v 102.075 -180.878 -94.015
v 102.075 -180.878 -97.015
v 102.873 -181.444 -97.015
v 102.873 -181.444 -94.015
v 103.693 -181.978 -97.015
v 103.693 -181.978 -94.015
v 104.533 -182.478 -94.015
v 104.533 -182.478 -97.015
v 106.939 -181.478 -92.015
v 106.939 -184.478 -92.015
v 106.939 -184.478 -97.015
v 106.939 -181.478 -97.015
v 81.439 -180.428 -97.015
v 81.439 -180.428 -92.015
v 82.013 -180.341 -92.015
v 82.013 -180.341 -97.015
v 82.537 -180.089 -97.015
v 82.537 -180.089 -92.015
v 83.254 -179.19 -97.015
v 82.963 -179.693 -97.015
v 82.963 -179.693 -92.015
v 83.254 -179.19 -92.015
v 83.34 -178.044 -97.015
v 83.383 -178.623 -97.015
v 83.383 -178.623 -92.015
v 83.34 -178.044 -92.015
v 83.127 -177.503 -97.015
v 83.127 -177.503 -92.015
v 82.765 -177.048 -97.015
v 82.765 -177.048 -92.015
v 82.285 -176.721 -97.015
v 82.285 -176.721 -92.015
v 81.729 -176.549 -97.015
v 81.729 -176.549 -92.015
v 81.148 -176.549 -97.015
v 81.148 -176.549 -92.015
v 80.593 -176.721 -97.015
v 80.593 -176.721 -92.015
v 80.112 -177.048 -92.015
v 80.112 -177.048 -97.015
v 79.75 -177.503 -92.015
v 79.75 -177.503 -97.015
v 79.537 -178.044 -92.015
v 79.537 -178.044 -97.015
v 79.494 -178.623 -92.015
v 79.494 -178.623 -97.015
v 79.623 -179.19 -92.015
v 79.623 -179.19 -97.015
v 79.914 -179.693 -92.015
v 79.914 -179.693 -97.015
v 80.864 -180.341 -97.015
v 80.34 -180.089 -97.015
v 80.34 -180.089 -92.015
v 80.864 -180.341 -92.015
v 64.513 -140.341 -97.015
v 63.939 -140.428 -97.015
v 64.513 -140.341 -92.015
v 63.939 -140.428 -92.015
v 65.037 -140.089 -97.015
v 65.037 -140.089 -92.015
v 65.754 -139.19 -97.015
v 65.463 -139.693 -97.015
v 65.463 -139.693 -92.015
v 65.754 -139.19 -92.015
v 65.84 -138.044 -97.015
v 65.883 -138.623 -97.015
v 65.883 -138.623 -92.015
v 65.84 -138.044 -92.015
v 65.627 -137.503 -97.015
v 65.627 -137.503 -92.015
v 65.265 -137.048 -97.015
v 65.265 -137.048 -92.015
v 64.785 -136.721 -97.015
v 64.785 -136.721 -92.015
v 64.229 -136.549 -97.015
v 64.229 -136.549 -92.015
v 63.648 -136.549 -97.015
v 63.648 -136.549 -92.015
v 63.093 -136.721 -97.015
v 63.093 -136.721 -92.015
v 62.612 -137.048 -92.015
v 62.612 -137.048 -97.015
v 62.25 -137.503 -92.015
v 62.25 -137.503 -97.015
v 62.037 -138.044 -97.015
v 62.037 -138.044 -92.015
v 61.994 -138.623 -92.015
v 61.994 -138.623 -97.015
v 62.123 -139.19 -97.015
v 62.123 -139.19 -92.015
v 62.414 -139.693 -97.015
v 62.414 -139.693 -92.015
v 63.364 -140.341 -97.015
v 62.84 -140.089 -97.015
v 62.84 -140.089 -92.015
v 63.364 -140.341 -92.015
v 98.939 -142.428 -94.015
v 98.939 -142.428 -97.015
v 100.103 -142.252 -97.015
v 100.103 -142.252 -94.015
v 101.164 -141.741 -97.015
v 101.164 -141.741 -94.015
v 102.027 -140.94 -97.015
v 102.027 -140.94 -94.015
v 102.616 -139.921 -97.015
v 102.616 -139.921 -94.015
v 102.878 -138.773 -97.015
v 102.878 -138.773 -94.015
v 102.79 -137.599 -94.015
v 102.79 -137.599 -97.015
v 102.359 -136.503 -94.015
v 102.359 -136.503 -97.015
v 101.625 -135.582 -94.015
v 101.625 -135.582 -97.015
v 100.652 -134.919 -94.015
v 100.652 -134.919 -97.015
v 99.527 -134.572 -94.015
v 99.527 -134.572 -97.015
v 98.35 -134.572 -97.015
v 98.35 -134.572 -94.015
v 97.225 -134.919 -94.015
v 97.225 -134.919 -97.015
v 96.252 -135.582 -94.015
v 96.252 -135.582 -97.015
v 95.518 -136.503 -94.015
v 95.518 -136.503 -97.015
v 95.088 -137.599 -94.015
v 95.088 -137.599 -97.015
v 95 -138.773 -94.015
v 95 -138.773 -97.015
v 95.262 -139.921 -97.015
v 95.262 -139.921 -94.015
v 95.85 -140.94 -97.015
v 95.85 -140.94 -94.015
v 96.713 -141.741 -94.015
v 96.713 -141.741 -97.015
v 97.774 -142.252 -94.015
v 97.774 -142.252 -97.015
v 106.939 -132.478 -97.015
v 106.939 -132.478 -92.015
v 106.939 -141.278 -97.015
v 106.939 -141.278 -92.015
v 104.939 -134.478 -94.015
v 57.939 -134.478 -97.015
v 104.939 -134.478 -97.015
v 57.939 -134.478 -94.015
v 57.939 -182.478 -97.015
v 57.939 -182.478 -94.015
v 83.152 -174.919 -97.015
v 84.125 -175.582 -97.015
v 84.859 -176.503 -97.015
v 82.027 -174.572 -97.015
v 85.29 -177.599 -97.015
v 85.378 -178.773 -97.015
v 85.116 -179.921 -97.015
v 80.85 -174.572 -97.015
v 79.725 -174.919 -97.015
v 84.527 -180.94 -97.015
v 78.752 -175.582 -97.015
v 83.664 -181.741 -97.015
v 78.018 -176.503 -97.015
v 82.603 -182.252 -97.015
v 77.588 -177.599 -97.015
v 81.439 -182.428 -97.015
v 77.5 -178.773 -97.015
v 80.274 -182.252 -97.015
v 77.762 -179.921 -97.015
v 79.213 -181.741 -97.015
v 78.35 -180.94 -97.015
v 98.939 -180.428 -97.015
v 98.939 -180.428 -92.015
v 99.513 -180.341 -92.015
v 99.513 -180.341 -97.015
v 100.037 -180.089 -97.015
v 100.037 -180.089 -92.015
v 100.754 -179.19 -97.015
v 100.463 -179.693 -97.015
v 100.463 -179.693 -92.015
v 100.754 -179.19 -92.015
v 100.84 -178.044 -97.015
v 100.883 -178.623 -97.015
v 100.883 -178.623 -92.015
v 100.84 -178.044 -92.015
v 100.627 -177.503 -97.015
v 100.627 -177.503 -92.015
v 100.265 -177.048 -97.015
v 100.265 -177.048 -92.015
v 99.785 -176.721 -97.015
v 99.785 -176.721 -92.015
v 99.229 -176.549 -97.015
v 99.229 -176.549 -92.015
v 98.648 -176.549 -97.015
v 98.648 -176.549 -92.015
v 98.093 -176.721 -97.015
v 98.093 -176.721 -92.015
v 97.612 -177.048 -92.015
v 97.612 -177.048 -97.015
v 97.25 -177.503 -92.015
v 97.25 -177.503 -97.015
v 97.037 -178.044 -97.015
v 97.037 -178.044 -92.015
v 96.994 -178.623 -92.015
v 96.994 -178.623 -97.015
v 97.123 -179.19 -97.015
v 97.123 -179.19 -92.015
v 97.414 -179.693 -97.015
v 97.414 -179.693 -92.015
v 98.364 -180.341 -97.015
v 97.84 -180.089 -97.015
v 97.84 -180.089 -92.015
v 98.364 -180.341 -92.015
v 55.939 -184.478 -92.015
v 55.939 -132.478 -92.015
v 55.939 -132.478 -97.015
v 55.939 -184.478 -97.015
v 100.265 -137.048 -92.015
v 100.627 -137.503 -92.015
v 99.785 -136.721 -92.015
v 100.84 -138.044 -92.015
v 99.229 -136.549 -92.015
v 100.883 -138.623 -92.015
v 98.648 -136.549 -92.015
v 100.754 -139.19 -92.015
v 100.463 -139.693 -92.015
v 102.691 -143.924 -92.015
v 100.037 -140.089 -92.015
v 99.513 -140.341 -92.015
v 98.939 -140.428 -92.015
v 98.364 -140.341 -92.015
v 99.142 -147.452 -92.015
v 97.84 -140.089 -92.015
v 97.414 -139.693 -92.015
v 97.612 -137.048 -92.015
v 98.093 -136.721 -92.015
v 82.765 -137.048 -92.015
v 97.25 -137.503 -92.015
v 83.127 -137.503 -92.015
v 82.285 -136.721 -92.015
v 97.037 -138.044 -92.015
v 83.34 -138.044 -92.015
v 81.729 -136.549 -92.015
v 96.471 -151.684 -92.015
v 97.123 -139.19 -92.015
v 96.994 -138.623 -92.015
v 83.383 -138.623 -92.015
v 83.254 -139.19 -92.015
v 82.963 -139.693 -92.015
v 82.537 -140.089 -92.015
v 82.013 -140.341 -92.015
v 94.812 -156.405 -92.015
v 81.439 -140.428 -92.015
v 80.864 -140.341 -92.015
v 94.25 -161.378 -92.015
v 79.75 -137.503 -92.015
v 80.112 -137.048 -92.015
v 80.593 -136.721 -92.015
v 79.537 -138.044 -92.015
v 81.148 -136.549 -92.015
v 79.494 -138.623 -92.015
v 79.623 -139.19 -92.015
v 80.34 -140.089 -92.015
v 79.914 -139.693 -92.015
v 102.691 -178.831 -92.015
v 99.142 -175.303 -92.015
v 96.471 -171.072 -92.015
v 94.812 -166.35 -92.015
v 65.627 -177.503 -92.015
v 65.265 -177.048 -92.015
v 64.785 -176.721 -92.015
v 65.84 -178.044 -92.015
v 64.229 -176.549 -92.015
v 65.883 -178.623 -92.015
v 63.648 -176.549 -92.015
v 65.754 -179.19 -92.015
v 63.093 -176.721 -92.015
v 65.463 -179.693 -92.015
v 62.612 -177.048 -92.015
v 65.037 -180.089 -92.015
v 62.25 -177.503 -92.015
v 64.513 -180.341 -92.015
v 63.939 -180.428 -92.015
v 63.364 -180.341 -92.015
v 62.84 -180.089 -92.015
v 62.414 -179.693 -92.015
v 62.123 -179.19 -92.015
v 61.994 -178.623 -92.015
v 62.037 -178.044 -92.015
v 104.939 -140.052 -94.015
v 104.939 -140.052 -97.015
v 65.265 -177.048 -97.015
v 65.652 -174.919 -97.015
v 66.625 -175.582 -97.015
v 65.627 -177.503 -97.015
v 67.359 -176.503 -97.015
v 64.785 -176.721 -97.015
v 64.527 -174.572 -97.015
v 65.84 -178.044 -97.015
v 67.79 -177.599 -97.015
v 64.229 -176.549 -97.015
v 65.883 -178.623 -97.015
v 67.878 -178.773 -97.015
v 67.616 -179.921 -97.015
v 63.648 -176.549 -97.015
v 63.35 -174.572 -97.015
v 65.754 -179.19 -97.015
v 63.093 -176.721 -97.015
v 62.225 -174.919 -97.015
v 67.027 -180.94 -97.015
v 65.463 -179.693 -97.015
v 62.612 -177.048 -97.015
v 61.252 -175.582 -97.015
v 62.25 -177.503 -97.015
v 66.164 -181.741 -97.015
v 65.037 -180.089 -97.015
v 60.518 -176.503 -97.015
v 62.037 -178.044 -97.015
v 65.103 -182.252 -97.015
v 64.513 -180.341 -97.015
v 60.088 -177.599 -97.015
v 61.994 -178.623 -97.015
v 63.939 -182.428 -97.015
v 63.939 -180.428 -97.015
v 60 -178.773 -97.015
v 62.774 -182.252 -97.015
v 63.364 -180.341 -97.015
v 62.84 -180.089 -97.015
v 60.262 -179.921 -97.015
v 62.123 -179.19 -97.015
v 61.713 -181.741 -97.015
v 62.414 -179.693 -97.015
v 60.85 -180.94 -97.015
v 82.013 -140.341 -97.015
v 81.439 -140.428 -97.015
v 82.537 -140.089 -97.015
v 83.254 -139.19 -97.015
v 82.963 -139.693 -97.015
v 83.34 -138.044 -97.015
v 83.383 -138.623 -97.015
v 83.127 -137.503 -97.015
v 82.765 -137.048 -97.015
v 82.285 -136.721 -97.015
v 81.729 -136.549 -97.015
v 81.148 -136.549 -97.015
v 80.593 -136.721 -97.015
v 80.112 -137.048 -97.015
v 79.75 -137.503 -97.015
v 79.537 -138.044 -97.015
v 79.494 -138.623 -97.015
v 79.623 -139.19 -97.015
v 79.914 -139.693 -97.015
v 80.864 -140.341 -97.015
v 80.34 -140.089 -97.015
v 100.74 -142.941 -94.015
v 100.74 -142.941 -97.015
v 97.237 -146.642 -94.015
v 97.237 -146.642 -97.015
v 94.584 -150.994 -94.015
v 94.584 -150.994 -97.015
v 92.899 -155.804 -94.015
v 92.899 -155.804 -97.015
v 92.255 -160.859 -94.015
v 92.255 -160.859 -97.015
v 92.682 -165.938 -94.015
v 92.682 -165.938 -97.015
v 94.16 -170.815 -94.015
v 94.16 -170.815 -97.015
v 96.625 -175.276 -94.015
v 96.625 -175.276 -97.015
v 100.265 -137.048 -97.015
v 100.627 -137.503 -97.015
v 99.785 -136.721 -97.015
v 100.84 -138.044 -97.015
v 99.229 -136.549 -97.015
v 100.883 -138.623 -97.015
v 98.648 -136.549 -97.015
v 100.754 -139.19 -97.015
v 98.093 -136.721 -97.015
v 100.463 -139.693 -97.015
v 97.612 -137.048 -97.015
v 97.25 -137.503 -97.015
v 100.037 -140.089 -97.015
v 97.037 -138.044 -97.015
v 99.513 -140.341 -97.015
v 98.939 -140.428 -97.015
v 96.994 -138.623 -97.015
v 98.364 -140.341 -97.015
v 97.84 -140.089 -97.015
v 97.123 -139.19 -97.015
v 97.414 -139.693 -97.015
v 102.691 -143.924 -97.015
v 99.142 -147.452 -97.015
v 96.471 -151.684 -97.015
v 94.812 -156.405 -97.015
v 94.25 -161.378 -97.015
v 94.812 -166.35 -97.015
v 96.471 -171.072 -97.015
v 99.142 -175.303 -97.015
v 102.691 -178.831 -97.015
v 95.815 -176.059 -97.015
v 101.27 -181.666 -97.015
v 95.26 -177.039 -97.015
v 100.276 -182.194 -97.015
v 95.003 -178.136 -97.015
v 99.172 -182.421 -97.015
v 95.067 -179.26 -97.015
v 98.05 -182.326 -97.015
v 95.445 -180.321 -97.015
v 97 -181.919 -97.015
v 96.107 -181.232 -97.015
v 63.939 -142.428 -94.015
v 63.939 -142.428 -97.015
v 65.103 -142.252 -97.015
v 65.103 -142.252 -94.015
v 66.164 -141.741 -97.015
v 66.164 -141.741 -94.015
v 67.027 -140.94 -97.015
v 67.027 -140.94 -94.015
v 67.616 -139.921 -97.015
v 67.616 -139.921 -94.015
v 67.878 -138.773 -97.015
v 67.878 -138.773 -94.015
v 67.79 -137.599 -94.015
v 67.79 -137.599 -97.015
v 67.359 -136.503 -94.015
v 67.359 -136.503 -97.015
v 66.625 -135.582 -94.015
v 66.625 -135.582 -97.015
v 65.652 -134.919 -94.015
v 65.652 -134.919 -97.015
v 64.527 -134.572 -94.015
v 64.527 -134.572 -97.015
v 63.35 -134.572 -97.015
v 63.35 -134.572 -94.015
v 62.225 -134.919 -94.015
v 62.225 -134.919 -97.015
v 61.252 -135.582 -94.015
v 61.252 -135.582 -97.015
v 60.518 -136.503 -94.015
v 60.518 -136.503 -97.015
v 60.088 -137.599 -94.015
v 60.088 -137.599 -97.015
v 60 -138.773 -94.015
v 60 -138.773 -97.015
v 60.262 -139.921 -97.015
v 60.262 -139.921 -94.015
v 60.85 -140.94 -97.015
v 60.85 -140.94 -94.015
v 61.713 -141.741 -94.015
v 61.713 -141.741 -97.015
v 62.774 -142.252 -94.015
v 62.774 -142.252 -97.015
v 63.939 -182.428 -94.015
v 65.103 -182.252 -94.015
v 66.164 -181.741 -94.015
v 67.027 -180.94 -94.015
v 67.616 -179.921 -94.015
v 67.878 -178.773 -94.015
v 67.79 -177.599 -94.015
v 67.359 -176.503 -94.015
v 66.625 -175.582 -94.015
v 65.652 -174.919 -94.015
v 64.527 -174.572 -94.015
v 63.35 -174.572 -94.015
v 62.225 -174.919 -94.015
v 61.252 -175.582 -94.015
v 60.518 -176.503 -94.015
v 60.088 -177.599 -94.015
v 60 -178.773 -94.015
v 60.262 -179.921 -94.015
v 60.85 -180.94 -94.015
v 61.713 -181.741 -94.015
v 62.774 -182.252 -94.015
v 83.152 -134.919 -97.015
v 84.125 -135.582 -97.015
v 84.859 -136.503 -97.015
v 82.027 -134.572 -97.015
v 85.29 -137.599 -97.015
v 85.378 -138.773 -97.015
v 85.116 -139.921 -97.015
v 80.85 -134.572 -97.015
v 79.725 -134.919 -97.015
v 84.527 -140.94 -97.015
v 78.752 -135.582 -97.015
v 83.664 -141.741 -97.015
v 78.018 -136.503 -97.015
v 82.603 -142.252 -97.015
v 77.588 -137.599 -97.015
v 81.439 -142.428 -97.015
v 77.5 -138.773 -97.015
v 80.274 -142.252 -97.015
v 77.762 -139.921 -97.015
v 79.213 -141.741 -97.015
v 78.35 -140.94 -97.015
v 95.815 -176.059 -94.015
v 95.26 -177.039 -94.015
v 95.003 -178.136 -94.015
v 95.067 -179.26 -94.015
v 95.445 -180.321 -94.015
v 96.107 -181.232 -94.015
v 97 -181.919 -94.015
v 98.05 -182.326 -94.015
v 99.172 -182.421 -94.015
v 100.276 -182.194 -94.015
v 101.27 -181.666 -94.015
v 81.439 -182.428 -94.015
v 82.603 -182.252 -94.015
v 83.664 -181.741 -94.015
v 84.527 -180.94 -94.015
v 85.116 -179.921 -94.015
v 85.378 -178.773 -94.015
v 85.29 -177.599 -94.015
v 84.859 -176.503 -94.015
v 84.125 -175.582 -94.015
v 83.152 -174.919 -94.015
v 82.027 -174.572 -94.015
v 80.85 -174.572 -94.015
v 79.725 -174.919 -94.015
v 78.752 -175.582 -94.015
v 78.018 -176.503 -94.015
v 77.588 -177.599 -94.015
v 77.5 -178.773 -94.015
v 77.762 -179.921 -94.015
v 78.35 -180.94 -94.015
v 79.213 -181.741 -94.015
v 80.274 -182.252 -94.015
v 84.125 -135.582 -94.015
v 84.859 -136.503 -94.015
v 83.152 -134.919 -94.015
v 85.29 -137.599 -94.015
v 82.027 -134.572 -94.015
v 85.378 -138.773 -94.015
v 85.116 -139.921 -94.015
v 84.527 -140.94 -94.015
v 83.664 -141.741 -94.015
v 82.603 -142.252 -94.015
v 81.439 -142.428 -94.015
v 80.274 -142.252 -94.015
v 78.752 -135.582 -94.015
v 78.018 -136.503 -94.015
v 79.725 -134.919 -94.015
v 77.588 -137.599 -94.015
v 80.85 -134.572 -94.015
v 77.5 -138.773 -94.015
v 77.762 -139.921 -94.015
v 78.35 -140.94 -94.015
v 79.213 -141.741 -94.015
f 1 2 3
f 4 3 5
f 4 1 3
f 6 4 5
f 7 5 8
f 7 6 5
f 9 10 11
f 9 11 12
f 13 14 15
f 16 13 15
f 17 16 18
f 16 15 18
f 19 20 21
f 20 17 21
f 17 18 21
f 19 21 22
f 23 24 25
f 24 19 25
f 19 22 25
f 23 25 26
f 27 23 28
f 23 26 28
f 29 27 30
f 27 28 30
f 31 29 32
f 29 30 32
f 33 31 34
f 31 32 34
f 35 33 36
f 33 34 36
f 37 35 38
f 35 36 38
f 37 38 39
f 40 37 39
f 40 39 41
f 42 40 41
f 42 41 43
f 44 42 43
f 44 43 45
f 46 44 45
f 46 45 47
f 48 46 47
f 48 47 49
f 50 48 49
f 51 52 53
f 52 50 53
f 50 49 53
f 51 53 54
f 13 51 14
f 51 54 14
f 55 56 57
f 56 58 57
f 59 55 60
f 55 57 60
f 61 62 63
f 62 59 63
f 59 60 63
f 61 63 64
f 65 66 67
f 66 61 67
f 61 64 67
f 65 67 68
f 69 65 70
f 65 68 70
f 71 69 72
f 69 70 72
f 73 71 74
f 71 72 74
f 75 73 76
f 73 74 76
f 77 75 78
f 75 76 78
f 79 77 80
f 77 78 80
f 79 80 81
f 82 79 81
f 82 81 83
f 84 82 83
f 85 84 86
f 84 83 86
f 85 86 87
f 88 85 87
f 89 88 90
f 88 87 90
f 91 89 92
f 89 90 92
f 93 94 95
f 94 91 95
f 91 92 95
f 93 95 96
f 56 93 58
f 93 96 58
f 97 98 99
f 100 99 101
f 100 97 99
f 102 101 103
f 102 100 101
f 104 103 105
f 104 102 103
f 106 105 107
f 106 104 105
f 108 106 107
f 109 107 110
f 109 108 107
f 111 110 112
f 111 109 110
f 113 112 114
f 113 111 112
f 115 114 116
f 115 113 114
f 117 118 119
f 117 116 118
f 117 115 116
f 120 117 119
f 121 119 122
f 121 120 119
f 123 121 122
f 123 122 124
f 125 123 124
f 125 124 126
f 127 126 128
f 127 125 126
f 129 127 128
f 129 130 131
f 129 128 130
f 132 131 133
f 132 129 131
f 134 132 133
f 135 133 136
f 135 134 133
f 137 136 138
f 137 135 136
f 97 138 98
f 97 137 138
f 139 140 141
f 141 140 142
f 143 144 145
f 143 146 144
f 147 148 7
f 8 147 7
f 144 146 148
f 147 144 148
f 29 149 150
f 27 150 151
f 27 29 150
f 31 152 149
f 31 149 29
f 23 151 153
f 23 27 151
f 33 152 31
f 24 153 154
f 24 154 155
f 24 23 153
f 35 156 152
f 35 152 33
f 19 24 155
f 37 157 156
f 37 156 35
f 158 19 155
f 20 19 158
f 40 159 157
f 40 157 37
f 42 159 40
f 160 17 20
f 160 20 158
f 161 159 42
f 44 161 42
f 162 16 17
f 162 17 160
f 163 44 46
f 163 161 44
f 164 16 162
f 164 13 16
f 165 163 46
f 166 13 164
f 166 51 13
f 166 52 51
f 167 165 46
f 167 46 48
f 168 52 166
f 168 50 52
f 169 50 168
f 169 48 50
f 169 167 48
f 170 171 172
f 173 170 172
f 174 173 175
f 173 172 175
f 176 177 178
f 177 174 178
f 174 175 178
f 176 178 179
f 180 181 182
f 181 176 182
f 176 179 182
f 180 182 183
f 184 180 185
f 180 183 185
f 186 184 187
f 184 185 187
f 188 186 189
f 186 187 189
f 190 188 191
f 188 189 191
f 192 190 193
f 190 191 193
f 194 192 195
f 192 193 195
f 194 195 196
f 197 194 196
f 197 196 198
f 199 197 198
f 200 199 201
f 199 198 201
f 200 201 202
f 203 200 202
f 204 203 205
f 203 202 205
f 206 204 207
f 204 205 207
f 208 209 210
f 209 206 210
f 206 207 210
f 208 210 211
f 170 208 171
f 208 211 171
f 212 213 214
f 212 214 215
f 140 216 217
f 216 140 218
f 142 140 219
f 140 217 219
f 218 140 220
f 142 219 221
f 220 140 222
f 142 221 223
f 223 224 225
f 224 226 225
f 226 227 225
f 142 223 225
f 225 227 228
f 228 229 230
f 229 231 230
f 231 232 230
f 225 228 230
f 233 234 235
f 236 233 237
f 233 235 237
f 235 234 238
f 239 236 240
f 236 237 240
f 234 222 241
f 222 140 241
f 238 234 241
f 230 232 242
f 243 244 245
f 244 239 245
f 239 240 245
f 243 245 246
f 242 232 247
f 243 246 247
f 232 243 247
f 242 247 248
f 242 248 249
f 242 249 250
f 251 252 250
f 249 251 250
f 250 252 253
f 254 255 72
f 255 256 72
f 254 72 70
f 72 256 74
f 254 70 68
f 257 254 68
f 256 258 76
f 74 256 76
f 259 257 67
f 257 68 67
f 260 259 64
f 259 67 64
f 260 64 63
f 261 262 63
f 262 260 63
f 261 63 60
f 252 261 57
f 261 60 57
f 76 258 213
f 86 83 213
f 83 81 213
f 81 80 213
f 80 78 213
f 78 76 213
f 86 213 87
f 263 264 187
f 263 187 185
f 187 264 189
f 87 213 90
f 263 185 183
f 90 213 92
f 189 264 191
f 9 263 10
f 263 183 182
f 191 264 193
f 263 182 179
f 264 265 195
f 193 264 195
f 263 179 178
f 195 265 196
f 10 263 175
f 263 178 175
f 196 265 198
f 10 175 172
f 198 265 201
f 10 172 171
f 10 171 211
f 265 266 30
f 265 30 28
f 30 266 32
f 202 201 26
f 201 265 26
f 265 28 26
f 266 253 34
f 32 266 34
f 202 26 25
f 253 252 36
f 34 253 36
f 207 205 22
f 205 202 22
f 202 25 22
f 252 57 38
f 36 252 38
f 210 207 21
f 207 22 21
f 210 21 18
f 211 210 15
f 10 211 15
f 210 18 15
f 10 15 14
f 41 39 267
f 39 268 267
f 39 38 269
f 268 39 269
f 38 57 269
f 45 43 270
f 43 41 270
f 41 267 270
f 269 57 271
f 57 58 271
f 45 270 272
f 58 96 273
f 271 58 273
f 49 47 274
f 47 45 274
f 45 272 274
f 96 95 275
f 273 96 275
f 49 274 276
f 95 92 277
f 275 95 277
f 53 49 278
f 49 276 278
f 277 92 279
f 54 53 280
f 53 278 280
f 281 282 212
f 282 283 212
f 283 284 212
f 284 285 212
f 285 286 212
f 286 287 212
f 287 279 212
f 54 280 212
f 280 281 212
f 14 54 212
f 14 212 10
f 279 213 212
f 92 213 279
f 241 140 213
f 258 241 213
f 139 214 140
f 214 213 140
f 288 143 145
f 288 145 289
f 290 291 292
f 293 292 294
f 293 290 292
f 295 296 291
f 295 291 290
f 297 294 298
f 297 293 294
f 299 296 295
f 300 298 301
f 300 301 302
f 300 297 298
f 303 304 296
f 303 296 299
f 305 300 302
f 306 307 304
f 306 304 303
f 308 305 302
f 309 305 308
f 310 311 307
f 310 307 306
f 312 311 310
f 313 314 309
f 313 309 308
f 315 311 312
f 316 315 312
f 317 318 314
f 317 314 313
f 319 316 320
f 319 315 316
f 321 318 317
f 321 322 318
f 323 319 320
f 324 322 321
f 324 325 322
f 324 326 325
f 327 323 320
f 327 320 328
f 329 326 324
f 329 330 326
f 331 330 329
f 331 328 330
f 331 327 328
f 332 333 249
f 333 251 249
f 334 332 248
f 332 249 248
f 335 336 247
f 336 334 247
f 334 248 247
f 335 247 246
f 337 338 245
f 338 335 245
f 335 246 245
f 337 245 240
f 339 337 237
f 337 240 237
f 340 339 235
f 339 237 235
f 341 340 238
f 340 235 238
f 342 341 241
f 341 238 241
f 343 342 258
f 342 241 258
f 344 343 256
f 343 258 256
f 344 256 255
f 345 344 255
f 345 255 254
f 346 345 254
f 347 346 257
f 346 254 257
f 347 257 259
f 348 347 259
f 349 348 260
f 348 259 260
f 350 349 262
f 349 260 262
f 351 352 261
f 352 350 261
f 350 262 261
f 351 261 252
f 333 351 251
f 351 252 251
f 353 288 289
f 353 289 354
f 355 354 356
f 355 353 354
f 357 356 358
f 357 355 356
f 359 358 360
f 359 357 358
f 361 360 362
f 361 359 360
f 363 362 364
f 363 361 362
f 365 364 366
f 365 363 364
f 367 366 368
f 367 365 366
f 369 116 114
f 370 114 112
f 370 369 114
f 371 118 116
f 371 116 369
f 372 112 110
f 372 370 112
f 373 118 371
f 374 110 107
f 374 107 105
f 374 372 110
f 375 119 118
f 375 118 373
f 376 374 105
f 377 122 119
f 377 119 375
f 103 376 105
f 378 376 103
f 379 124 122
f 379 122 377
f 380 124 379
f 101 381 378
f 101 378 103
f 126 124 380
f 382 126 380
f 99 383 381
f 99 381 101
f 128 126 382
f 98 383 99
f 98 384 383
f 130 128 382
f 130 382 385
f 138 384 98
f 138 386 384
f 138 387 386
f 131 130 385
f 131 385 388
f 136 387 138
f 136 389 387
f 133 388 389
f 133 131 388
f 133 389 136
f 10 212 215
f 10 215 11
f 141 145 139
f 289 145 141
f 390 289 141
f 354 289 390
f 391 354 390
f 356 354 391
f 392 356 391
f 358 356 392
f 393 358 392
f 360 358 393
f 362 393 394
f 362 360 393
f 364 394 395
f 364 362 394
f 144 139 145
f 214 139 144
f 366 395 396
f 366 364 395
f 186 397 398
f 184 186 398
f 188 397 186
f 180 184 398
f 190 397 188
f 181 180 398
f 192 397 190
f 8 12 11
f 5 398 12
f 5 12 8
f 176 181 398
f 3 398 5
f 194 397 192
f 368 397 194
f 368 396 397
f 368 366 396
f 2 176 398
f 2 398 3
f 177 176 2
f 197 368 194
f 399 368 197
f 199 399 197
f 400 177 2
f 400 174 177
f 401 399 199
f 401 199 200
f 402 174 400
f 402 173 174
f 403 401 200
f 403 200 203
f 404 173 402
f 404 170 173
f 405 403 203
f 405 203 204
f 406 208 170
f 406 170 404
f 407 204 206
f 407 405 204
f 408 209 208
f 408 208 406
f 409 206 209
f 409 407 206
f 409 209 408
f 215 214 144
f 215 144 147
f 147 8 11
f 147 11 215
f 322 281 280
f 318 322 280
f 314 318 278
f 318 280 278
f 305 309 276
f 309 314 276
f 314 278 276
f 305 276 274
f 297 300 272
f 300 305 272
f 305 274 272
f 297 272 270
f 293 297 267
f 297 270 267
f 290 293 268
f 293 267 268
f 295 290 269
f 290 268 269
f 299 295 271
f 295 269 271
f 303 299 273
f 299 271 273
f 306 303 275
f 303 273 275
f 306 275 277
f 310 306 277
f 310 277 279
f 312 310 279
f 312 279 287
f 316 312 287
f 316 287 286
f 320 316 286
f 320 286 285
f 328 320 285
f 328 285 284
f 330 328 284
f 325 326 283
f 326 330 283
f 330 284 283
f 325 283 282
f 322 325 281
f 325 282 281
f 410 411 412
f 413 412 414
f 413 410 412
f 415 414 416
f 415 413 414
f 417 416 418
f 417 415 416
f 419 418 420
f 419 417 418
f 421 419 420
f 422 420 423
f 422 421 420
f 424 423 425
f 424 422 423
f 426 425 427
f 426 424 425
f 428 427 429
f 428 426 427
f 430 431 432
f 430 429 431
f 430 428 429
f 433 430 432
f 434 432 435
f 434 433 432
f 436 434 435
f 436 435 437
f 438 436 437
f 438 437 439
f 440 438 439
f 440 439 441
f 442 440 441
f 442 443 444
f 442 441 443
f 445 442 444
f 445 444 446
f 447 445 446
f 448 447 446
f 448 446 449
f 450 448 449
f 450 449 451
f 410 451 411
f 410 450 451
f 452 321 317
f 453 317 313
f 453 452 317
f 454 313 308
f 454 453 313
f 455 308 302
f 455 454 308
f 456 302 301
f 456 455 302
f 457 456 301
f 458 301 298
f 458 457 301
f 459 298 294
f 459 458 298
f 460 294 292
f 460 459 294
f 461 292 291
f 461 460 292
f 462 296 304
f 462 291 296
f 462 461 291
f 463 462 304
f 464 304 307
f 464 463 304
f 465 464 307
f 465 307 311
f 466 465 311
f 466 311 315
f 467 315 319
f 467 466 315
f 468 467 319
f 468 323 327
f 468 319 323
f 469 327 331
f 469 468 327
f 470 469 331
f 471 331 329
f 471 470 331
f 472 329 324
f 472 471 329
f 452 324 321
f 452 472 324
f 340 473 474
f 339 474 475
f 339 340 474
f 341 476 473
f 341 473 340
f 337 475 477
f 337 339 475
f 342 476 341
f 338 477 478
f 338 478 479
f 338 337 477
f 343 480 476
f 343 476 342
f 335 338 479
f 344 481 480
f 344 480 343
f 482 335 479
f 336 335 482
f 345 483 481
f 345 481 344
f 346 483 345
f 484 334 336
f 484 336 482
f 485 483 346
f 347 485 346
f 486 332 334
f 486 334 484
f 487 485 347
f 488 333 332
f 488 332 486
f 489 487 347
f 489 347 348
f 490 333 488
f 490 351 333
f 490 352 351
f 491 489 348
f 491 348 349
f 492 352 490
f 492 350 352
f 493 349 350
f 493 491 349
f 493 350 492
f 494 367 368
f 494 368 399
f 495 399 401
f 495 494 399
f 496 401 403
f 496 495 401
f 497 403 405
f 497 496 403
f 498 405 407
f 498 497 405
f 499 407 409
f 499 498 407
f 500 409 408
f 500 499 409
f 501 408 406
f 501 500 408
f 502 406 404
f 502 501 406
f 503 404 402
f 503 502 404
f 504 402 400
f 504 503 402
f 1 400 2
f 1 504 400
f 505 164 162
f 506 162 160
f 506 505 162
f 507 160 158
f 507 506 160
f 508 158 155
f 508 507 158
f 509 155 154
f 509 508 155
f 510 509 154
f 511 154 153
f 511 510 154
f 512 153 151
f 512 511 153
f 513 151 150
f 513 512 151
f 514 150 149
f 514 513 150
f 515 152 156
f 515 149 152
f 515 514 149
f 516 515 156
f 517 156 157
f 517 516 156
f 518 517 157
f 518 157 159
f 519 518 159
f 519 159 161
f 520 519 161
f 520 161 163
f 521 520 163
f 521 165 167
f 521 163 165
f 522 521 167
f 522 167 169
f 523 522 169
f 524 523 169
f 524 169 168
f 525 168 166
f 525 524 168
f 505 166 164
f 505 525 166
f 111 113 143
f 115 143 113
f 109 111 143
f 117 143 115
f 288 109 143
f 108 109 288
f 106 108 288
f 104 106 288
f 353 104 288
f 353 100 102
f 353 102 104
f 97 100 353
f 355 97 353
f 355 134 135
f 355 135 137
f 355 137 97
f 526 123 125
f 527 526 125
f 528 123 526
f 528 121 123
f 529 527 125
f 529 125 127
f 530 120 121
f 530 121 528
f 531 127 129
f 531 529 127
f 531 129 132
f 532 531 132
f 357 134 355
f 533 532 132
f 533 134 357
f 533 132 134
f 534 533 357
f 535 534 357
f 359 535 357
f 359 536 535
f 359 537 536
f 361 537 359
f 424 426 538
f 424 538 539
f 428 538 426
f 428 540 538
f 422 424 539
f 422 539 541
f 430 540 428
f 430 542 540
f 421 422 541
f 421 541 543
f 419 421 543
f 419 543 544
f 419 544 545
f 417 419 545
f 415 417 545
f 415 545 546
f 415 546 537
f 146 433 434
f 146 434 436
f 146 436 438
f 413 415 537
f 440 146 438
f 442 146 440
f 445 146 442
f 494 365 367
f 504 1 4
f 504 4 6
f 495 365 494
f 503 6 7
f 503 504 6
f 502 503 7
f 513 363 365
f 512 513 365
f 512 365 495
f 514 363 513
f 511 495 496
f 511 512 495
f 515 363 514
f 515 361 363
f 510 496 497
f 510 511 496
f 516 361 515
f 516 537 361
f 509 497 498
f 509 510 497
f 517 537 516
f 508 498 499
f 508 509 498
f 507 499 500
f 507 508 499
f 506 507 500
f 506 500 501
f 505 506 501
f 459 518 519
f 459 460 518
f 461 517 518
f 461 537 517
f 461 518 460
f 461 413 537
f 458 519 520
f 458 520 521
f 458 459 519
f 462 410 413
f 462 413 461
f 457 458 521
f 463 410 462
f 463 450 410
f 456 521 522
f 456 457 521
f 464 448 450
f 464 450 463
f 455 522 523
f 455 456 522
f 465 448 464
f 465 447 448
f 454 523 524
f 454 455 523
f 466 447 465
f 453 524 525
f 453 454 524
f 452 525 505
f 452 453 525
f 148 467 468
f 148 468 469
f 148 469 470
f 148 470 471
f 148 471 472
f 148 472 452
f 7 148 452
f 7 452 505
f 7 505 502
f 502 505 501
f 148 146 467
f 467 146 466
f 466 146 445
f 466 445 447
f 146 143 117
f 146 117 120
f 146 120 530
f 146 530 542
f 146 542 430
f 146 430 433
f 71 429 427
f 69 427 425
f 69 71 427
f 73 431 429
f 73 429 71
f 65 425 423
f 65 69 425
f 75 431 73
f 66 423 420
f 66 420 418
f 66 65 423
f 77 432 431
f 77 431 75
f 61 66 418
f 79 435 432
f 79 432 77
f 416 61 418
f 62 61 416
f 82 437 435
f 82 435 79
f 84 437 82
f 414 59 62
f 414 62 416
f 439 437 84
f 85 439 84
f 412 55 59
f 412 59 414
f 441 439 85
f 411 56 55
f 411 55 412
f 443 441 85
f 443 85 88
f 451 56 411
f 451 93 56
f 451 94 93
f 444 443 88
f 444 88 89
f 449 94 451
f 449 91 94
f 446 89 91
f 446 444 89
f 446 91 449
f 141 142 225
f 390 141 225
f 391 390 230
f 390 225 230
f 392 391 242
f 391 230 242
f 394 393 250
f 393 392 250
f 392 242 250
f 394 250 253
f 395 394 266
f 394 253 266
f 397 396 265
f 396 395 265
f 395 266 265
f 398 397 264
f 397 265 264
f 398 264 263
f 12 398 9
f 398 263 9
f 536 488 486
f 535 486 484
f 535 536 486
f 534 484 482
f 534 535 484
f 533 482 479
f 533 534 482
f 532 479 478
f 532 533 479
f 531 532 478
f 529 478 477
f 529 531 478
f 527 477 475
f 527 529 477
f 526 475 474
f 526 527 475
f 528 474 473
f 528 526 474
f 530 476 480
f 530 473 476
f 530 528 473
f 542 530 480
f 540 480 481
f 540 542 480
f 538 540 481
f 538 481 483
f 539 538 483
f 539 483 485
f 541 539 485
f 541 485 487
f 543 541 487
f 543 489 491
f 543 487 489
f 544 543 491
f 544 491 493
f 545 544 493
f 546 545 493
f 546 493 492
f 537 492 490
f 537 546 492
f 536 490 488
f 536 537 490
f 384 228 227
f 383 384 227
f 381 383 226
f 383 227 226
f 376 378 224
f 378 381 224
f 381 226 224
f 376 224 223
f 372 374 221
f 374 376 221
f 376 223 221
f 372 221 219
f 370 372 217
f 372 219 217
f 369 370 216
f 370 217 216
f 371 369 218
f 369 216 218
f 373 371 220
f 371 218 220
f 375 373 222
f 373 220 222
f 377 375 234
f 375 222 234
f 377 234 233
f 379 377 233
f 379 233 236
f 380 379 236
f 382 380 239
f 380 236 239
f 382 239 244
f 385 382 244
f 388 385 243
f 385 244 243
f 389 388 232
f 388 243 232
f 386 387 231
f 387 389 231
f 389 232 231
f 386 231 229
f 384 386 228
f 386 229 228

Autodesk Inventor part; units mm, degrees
ref_plane "YZ Plane" through (0, 0, 0) normal (1, 0, 0) x (0, 1, 0)
ref_plane "XZ Plane" through (0, 0, 0) normal (0, 1, 0) x (-1, 0, 0)
ref_plane "XY Plane" through (0, 0, 0) normal (0, 0, 1) x (1, 0, 0)
ref_plane "Work Plane2" through (153.4386, -53.4776, -92.0146) normal (0, 0, -1) x (0, -1, 0)
sketch "Sketch2" plane through (153.4386, -53.4776, -92.0146) normal (0, 0, -1) x (0, -1, 0)
  line L0 (93.2, 97.5) -> (213.5, 97.5) construction
  line L1 (40, 105.5) -> (170, 105.5) construction
  line L2 (-3.5, 97.5) -> (93.2, 97.5) construction
  line L3 (40, 105.5) -> (170, 105.5) construction
  line L4 (0.0695, 95.5) -> (93.2, 95.5) construction
  line L5 (93.2, 95.5) -> (209.9305, 95.5) construction
  arc A0 (93.2, 56.229) -> (86.5748, 48.5) centre (107.9, 36.9243) ccw construction
  line L6 (93.2, 95.5) -> (93.2, 56.229) construction
  arc A1 (120.0681, 57.9171) -> (93.2, 56.229) centre (107.9, 36.9243) ccw construction
  arc A2 (128.5511, 49.6637) -> (120.0681, 57.9171) centre (125, 54.5) ccw construction
  arc A3 (129.2252, 48.5) -> (128.5511, 49.6637) centre (107.9, 36.9243) ccw construction
  line L7 (134.8038, 48.5) -> (129.2252, 48.5) construction
  arc A4 (145.1962, 48.5) -> (134.8038, 48.5) centre (140, 51.5) ccw construction
  line L8 (159.8038, 48.5) -> (145.1962, 48.5) construction
  arc A5 (170.1962, 48.5) -> (159.8038, 48.5) centre (165, 51.5) ccw construction
  line L9 (184.8038, 48.5) -> (170.1962, 48.5) construction
  arc A6 (195.1962, 48.5) -> (184.8038, 48.5) centre (190, 51.5) ccw construction
  line L10 (198.5, 48.5) -> (195.1962, 48.5) construction
  arc A7 (204.5, 42.5) -> (198.5, 48.5) centre (198.5, 42.5) ccw construction
  line L11 (204.5, -42.5) -> (204.5, 42.5) projected
  arc A8 (204.5, -42.5) -> (206.5, -44.5) centre (206.5, -42.5) ccw projected
  line L12 (207.3038, -44.5) -> (206.5, -44.5) projected
  arc A9 (215.5, -36.3038) -> (207.3038, -44.5) centre (212.5, -41.5) ccw projected
  line L13 (215.5, 87.3038) -> (215.5, -36.3038) construction
  arc A10 (207.3038, 95.5) -> (215.5, 87.3038) centre (212.5, 92.5) ccw construction
  line L14 (125, 95.5) -> (207.3038, 95.5) construction
  circle A11 centre (125, 89.5) radius 6 construction
  line L15 (93.2, 95.5) -> (125, 95.5) construction
  circle A12 centre (125, 72) radius 6 construction
  circle A13 centre (190, 76.5) radius 6 construction
  circle A14 centre (140, 76.5) radius 6 construction
  arc A15 (93.2, 53.646) -> (87.8, 46.5) centre (107.9, 36.9243) ccw construction
  arc A16 (128, 46.5) -> (93.2, 53.646) centre (107.9, 36.9243) ccw construction
  circle A17 centre (85, 89.5) radius 6 construction
  circle A18 centre (125, 89.5) radius 6 construction
  line L16 (79, 97.5) -> (79, 46.5)
  line L17 (79, 46.5) -> (87.8, 46.5)
  line L18 (79, 97.5) -> (131, 97.5)
  line L19 (131, 97.5) -> (131, 48.5)
  line L20 (131, 48.5) -> (131, 46.5)
  line L21 (131, 46.5) -> (128, 46.5)
  arc A19 (128, 46.5) -> (87.8, 46.5) centre (107.9, 36.9243) ccw
  circle A20 centre (85, 54.5) radius 1.95 projected
  circle A21 centre (85, 72) radius 1.95 projected
  circle A22 centre (85, 89.5) radius 1.95 projected
  circle A23 centre (125, 89.5) radius 1.95 projected
  circle A24 centre (125, 72) radius 1.95 projected
  circle A25 centre (125, 54.5) radius 1.95 projected
  point P0 (-53.4776, 153.4386)
extrude "Extrusion2" add sketch "Sketch2" along normal blind 5
shell "Shell2" thickness 2 removed faces 1 at (70.074, -152.3865, -97.0146)
properties part number "02_Zeiss_Axiotech_adapterplate_rightleft_connector"
